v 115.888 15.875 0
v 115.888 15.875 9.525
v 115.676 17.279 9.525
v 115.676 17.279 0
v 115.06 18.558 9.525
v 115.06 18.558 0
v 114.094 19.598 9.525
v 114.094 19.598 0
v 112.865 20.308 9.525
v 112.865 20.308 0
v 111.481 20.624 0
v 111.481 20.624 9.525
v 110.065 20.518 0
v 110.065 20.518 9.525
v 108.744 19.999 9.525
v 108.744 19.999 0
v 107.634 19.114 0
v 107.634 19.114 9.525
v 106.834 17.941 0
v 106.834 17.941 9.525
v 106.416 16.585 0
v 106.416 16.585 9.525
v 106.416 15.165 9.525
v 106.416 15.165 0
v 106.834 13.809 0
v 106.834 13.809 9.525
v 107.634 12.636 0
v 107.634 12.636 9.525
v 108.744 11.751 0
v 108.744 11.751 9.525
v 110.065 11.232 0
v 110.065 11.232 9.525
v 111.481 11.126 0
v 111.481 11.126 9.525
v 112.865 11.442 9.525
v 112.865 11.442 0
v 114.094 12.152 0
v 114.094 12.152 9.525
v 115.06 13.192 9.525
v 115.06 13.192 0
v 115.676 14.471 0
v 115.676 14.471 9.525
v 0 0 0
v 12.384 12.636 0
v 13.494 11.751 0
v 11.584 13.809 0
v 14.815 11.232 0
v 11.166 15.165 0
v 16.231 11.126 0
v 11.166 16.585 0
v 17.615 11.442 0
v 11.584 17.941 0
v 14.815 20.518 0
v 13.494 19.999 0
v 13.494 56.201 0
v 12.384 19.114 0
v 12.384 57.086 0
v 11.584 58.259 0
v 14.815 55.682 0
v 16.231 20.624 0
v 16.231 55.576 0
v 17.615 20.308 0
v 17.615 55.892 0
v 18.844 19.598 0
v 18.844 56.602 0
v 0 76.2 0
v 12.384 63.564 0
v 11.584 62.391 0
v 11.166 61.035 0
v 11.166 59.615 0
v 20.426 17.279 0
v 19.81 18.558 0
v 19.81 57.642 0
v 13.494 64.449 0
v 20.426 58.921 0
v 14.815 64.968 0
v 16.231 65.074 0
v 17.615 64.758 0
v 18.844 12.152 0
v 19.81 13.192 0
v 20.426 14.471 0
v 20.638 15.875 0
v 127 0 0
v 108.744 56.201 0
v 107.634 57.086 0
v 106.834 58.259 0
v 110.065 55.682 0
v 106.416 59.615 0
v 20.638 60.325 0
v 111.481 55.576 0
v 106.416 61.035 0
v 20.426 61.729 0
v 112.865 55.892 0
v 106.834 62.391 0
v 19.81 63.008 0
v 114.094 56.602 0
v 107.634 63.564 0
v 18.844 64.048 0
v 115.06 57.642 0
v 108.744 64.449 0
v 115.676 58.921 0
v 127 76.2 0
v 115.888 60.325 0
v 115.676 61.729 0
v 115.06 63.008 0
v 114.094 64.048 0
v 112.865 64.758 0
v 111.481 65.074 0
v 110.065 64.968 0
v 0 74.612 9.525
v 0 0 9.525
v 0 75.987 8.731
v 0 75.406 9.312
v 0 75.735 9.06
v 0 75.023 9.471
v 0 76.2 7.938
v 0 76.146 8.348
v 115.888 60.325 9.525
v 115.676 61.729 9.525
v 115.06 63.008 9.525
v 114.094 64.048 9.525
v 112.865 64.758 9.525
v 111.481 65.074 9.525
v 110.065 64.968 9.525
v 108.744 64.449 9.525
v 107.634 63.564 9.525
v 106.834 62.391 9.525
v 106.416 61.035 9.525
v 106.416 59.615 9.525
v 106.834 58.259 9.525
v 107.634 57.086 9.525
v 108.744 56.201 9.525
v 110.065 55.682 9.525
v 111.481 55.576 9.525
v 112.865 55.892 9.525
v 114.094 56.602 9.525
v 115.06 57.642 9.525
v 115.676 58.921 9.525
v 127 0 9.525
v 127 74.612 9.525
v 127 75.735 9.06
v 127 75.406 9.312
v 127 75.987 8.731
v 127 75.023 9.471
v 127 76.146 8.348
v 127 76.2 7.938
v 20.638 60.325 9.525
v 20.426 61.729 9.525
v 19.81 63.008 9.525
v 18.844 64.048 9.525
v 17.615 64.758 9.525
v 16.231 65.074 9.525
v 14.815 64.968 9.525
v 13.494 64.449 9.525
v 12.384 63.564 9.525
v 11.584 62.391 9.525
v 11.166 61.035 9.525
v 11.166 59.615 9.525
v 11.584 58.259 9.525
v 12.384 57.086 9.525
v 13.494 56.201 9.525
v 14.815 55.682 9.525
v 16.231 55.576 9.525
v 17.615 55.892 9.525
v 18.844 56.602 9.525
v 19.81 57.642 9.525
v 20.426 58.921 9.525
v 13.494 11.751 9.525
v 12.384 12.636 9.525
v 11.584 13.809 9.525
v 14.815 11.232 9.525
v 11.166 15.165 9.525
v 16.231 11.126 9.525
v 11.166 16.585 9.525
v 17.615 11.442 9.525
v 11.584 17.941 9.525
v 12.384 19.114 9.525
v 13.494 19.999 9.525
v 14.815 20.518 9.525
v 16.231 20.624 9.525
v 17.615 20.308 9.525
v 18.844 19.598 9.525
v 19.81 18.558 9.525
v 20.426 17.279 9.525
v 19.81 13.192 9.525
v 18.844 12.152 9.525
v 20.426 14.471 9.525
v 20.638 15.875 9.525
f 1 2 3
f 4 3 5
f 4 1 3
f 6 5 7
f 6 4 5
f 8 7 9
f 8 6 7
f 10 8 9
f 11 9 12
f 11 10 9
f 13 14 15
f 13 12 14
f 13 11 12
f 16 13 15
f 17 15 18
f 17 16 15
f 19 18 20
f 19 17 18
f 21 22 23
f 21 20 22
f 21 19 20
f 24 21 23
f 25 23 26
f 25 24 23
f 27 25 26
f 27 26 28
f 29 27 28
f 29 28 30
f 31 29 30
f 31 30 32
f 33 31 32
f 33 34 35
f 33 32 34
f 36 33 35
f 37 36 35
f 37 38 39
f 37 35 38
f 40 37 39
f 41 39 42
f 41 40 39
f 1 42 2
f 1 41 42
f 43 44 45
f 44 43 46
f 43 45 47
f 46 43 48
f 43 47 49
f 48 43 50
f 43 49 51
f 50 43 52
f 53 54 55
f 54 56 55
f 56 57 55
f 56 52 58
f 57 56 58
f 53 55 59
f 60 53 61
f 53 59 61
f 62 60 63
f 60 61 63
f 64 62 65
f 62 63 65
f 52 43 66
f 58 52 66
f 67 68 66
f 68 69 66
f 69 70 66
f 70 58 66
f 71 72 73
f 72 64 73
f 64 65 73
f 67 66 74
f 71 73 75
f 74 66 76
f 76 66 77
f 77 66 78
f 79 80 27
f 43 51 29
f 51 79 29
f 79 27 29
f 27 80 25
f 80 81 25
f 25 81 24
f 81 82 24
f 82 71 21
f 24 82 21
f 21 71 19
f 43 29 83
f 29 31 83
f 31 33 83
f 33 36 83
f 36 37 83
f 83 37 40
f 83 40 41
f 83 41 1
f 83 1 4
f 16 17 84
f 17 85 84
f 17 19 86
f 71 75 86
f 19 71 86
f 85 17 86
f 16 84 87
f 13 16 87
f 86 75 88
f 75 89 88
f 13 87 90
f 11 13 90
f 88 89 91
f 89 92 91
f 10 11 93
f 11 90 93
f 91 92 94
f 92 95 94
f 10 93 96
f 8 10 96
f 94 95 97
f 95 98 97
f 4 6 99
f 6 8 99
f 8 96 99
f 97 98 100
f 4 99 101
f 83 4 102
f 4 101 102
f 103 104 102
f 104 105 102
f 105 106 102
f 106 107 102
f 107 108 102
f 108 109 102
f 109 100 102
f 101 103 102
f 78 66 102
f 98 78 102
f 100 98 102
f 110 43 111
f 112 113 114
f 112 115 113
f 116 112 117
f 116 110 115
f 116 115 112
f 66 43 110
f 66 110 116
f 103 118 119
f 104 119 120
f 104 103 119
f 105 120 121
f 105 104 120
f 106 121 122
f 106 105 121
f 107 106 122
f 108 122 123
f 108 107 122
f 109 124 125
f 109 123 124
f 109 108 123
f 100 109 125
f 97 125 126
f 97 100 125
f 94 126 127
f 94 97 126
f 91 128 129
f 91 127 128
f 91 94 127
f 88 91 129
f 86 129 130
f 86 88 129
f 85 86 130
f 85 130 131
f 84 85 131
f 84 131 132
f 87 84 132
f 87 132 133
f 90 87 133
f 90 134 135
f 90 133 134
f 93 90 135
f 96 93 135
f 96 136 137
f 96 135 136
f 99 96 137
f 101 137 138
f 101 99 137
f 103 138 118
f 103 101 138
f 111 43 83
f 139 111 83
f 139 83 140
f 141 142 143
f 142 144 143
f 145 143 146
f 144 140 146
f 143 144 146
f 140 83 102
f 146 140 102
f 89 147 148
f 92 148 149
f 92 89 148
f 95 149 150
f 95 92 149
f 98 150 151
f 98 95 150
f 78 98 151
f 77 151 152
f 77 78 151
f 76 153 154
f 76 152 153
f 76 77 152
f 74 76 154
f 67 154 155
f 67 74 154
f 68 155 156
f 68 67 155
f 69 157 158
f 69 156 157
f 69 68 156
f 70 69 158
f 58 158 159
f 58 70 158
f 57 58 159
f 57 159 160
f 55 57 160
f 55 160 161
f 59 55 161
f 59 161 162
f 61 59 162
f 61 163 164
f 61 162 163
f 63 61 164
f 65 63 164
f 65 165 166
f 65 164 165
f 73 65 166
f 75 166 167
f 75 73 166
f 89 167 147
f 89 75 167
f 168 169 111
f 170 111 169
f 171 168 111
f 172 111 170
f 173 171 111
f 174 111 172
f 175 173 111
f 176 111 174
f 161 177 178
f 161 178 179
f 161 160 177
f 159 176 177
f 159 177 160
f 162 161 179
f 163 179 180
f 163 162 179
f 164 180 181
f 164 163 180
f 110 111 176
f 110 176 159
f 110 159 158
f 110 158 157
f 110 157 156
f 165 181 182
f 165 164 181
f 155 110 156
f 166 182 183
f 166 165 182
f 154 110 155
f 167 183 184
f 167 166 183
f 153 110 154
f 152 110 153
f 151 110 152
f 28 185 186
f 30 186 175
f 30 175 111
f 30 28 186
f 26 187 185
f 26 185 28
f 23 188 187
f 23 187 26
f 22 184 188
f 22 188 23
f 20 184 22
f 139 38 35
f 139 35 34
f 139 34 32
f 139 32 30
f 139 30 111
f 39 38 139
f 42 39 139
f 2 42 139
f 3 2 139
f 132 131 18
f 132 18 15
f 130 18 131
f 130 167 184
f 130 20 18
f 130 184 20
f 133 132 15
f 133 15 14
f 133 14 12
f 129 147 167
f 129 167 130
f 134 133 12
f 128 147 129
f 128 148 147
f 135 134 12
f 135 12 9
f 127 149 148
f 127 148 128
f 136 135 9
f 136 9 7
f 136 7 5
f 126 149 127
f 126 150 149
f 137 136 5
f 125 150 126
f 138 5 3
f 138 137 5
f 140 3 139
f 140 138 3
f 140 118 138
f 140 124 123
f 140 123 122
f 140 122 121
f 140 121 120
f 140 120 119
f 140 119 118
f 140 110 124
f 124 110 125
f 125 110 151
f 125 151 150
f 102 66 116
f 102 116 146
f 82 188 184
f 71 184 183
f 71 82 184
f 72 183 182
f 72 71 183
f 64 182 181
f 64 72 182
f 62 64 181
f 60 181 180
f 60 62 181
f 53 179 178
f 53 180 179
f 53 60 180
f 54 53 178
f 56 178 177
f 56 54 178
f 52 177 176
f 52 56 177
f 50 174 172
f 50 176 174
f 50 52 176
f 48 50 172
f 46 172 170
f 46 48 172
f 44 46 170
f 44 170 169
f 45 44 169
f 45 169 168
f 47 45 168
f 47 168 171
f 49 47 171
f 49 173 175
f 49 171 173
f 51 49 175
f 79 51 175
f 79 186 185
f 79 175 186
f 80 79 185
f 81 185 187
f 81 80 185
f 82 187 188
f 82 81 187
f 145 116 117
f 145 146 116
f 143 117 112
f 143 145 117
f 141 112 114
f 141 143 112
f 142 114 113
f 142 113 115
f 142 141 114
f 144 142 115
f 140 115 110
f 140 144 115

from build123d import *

# Parameters (mm, degrees)
SKETCH1_W   = 127
SKETCH1_H   = 76.2
BASE_DEPTH  = 9.525
SKETCH2_R   = 4.7625
HOLES_DEPTH = 149.412147835
FILLET2_R   = 1.5875


with BuildPart() as part:
    # Sketch1 → base (new body)
    with BuildSketch(Plane.XY):
        with Locations((63.5, 38.1)):
            Rectangle(SKETCH1_W, SKETCH1_H)
    extrude(amount=BASE_DEPTH)

    # Sketch2 → holes (cut, through all)
    with BuildSketch(Plane.XY):
        with Locations((15.875, 15.875)):
            Circle(SKETCH2_R)
        with Locations((111.125, 15.875)):
            Circle(SKETCH2_R)
        with Locations((15.875, 60.325)):
            Circle(SKETCH2_R)
        with Locations((111.125, 60.325)):
            Circle(SKETCH2_R)
    extrude(amount=HOLES_DEPTH, mode=Mode.SUBTRACT)

    # Fillet2
    fillet2_edges = [part.edges().sort_by_distance(p)[0] for p in [
        (63.5, 76.2, 9.525),
    ]]
    fillet(fillet2_edges, radius=FILLET2_R)


solid = part.part
